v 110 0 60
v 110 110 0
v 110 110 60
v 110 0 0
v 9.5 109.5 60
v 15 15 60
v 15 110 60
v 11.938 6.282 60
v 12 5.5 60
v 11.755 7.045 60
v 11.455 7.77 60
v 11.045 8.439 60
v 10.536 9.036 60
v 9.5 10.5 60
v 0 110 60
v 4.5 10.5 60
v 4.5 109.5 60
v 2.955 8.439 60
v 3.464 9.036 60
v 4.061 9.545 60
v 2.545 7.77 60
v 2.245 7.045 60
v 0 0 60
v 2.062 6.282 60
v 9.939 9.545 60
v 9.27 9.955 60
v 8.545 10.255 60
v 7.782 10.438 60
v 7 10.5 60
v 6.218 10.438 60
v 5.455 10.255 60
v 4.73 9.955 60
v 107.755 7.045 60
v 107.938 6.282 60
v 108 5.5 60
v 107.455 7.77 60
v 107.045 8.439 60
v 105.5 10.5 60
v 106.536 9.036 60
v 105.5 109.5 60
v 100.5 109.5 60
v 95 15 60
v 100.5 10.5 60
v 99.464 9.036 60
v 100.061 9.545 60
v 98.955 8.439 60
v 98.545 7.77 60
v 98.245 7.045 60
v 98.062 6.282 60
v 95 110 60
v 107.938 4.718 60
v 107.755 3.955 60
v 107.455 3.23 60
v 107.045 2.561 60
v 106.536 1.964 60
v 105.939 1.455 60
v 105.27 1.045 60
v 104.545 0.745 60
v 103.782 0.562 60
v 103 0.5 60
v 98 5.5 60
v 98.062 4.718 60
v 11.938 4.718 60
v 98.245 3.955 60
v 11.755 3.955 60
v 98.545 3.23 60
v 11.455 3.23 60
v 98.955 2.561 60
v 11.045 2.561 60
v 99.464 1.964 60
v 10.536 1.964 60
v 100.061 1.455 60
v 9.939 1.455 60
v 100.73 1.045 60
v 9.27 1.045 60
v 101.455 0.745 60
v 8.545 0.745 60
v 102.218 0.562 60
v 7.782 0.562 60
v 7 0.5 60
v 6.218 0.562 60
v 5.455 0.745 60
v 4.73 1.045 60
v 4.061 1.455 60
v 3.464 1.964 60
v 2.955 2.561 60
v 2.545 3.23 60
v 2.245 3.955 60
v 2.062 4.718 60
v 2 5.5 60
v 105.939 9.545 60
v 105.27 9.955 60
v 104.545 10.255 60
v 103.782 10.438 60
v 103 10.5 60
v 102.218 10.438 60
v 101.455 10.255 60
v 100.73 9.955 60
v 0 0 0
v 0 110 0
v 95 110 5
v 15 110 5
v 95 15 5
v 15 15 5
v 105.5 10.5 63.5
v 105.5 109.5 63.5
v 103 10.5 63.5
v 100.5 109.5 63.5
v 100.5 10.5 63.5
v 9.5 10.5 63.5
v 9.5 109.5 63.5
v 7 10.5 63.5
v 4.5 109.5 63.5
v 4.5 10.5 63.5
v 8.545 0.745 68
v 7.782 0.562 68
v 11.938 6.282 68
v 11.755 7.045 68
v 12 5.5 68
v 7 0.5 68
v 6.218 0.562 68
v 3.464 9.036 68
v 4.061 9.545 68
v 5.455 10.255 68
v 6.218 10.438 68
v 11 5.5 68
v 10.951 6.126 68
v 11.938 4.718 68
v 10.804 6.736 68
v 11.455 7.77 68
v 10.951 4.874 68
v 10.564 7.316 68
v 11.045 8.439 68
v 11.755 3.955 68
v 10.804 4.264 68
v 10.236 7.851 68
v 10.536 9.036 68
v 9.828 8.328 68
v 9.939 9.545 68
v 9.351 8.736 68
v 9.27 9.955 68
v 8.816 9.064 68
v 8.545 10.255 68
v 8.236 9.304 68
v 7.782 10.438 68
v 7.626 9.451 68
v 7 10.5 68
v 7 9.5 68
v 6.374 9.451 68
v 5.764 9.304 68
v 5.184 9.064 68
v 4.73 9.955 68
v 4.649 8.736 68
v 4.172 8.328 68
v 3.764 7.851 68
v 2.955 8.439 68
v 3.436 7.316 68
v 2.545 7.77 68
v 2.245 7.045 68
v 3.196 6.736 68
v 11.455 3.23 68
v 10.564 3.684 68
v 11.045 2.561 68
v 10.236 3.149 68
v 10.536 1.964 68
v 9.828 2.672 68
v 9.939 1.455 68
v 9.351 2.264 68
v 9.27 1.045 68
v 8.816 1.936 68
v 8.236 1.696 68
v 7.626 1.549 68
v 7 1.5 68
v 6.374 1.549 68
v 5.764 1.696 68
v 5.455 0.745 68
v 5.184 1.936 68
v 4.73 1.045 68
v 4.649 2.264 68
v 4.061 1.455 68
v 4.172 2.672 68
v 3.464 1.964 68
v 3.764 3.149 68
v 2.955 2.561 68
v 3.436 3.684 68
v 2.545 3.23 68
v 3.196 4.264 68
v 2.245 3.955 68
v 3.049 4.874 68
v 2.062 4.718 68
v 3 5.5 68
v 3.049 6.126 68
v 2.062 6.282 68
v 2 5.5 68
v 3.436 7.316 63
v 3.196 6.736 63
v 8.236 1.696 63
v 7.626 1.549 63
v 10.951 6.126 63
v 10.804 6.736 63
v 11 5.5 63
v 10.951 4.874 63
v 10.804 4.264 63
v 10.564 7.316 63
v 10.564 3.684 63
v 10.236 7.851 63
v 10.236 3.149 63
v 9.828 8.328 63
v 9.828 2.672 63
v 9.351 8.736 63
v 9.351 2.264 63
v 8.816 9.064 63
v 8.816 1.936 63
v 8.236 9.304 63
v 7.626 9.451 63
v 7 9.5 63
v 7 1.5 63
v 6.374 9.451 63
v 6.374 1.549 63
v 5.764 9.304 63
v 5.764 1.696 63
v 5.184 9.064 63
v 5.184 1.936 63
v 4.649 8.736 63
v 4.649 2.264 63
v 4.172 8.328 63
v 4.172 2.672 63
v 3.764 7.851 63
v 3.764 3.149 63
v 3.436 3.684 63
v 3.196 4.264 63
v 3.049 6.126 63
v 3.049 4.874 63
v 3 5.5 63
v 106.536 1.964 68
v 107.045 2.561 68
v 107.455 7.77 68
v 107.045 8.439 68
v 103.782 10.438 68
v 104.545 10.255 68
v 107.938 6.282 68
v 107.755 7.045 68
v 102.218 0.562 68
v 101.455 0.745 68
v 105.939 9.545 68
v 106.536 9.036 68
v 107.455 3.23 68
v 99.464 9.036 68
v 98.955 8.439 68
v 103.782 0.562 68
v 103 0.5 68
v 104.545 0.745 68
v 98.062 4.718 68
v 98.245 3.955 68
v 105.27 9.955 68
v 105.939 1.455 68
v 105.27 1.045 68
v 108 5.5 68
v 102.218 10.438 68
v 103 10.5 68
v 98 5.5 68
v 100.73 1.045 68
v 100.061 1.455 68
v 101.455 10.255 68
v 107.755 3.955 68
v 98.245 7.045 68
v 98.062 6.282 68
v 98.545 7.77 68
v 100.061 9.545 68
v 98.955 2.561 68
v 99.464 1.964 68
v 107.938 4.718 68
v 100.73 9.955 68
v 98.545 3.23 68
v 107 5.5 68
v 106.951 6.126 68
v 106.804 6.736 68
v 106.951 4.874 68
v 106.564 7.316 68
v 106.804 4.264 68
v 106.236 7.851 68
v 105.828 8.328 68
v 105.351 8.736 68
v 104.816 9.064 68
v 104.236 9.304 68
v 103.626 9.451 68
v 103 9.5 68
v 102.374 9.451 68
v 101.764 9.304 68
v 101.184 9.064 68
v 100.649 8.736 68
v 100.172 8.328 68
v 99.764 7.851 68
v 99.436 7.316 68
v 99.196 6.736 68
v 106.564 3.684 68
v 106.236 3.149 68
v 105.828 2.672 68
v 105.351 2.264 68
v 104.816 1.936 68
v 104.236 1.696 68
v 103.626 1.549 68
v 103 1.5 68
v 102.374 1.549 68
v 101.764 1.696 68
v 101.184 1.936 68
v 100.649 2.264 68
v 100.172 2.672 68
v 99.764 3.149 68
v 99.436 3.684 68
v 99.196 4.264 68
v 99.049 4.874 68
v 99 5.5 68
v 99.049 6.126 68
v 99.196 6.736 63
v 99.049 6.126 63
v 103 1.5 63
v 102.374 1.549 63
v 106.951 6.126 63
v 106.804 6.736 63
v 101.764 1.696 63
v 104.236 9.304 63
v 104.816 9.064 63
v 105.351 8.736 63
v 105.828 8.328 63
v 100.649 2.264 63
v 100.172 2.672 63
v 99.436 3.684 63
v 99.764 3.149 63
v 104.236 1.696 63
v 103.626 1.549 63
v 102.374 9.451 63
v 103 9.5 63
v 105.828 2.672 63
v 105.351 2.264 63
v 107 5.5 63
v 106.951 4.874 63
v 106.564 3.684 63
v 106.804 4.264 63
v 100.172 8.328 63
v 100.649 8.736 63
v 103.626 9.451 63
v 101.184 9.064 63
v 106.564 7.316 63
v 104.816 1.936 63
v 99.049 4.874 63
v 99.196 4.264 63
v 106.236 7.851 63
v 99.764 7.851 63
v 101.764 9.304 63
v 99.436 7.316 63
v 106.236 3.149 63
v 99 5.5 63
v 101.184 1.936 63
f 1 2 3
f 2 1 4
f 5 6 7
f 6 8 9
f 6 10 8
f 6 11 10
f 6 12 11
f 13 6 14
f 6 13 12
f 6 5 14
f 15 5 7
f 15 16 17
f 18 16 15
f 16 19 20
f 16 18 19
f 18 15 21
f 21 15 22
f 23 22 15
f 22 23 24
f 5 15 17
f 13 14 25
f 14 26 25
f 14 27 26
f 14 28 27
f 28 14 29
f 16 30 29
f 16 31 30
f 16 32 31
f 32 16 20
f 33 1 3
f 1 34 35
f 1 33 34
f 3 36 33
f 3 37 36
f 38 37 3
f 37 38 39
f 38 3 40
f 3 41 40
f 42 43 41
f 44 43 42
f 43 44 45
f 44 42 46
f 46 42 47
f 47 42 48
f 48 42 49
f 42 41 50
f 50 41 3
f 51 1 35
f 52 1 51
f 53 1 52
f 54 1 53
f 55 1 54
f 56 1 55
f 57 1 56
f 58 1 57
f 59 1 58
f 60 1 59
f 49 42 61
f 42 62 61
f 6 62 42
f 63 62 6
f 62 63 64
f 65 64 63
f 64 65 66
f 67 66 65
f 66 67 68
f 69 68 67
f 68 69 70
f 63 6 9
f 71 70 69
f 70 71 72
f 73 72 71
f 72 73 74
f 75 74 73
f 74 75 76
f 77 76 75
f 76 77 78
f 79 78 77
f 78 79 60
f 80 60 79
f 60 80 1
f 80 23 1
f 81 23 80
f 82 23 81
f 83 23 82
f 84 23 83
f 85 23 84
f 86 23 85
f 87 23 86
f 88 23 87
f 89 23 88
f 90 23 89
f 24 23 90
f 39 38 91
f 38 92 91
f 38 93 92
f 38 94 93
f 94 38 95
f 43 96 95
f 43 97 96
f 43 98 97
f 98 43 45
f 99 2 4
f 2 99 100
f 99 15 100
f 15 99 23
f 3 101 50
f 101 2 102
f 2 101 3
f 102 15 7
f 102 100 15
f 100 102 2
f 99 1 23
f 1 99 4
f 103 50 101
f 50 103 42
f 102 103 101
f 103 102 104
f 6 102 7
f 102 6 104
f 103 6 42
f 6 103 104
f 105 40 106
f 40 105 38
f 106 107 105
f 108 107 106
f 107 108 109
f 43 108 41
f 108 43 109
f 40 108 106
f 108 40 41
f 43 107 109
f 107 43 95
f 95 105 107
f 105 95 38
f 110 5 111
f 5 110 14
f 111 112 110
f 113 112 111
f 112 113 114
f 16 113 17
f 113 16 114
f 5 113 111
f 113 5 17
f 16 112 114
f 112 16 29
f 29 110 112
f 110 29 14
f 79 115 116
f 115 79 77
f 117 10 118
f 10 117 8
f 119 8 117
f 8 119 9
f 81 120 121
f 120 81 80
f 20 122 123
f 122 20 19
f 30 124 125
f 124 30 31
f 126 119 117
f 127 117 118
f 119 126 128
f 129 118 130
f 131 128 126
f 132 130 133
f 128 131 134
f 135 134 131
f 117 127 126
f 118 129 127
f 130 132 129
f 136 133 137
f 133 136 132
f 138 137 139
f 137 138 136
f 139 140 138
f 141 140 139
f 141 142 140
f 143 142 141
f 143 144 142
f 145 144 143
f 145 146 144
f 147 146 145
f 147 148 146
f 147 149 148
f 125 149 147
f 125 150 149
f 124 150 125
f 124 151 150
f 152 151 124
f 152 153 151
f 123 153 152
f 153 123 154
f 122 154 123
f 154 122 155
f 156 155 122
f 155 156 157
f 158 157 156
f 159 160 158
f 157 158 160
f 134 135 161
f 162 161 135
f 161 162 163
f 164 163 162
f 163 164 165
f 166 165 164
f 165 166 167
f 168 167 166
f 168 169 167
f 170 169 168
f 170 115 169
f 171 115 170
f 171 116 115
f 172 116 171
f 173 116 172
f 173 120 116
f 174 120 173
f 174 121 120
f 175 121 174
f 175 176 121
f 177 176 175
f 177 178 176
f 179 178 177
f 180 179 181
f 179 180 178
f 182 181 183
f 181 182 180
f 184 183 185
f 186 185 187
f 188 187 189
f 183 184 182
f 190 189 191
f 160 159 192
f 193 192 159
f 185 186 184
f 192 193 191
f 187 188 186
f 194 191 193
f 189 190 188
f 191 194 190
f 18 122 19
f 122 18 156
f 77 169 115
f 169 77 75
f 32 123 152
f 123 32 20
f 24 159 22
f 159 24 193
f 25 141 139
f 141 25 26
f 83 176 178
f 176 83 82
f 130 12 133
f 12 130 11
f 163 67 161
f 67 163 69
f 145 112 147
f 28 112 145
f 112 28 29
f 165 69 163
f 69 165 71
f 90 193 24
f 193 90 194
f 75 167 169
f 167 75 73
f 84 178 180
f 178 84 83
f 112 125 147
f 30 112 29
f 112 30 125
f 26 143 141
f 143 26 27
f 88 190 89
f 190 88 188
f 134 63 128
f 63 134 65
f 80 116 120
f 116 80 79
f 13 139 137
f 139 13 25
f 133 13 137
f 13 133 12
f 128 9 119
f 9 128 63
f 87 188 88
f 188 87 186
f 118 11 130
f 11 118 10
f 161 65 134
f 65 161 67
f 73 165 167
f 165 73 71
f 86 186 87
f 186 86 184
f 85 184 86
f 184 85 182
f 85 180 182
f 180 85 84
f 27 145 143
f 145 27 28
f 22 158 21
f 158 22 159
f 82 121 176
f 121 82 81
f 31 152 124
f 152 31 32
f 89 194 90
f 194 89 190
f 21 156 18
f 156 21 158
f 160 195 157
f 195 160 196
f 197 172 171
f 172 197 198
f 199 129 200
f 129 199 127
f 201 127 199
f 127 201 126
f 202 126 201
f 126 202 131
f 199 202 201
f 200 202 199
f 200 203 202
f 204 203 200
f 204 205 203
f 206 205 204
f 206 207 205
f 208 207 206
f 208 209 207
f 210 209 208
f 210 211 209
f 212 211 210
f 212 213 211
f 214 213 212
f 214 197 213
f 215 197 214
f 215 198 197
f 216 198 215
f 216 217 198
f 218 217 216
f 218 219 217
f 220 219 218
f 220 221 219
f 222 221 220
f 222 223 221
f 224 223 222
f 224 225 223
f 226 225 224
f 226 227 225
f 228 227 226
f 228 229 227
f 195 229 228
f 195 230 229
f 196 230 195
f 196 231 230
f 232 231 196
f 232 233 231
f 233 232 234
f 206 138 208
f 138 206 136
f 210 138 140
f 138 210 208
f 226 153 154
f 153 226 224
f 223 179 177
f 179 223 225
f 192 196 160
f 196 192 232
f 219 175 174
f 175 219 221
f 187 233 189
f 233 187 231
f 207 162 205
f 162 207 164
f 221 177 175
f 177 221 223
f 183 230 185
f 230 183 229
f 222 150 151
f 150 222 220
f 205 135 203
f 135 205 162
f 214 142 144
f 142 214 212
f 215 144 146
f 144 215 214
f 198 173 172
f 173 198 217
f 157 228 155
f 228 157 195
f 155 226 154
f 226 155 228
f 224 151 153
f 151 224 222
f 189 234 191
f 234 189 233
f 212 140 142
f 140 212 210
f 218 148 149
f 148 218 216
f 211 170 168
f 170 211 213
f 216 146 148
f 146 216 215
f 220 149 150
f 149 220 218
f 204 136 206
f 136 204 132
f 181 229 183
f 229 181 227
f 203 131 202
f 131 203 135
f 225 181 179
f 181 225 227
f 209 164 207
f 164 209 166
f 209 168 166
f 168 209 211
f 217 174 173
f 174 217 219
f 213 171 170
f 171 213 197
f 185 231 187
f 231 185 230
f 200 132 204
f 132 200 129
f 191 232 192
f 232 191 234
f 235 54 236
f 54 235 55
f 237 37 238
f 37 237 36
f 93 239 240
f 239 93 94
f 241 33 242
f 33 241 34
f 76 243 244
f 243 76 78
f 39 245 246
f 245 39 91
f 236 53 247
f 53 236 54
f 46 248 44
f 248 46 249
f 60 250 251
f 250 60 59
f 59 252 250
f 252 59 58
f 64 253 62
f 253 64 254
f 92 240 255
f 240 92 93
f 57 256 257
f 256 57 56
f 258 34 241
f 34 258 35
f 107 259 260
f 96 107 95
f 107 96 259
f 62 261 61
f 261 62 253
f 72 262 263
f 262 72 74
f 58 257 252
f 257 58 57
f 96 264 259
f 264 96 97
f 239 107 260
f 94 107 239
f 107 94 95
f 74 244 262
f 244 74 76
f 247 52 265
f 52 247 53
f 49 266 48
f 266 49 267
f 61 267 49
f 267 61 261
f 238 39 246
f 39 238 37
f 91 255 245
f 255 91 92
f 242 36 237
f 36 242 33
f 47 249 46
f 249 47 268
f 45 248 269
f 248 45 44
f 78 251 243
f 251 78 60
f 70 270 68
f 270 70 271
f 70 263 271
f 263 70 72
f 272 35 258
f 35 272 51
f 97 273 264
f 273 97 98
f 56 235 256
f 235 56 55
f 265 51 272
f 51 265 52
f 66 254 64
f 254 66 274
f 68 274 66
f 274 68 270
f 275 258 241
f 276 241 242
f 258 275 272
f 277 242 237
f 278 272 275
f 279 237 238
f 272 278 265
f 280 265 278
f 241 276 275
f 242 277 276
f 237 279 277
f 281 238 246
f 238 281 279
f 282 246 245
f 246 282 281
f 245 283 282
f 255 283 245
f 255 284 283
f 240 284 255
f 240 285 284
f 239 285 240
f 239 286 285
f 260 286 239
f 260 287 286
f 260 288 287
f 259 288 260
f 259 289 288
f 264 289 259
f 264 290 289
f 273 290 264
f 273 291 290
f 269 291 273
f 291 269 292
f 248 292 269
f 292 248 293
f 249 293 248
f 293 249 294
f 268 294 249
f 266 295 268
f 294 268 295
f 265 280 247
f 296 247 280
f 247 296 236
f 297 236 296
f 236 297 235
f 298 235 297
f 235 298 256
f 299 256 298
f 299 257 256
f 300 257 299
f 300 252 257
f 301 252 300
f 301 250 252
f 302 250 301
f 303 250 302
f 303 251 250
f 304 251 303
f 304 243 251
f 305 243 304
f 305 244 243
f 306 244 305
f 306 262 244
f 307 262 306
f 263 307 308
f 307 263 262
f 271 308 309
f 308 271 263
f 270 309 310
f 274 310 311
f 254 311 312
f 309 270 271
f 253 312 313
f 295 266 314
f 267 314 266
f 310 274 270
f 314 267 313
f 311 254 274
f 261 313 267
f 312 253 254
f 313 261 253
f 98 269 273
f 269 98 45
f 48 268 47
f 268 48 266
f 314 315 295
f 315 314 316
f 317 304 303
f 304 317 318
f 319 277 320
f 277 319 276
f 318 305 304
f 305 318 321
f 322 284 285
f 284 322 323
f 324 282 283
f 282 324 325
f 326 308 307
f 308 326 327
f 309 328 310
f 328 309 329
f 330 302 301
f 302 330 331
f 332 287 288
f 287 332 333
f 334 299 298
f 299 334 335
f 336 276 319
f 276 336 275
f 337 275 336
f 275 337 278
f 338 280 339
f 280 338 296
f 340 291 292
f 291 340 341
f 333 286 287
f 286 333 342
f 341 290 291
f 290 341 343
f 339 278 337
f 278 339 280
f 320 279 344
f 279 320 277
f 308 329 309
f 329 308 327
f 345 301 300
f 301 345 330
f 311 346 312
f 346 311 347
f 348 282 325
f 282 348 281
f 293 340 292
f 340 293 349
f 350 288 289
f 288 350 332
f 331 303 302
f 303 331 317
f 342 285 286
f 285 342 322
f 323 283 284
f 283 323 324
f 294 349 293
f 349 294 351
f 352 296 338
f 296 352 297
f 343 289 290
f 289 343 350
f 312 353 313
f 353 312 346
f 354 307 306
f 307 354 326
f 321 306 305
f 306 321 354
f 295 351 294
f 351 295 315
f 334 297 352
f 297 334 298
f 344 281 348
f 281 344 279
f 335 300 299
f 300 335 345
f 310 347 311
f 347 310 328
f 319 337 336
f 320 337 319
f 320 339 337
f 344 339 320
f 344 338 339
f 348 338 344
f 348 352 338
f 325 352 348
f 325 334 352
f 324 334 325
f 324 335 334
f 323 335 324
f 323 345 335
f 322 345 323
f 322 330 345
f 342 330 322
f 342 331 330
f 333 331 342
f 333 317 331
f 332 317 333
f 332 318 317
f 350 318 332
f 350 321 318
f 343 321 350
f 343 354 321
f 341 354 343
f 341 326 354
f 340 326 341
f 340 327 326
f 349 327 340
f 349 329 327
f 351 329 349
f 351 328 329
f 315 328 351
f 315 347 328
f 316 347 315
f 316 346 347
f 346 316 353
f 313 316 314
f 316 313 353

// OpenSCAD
    difference(){
      cube([110, 110, 60]);
        
        translate([15, 15, 5])
        cube([80,109,80]);
}

module unit_ridge(){
    cube([5,5,7], true);
}
cols = 95;
    
   for(y = [0:cols-1]){
         translate([103,107 - y,60]){
      unit_ridge();
      }
  }    

for(y = [0:cols-1]){
    translate([7, 107 - y, 60]){
        unit_ridge();
     }
}  

$fn = 40;

difference(){
translate([7, 5.5, 60])
cylinder(8,5,5);
    

translate([7, 5.5, 63])
cylinder(6,4,4);

}
difference(){
translate([103, 5.5, 60])
cylinder(8,5,5);
    
    
translate([103, 5.5, 63])
cylinder(6,4,4);
}
